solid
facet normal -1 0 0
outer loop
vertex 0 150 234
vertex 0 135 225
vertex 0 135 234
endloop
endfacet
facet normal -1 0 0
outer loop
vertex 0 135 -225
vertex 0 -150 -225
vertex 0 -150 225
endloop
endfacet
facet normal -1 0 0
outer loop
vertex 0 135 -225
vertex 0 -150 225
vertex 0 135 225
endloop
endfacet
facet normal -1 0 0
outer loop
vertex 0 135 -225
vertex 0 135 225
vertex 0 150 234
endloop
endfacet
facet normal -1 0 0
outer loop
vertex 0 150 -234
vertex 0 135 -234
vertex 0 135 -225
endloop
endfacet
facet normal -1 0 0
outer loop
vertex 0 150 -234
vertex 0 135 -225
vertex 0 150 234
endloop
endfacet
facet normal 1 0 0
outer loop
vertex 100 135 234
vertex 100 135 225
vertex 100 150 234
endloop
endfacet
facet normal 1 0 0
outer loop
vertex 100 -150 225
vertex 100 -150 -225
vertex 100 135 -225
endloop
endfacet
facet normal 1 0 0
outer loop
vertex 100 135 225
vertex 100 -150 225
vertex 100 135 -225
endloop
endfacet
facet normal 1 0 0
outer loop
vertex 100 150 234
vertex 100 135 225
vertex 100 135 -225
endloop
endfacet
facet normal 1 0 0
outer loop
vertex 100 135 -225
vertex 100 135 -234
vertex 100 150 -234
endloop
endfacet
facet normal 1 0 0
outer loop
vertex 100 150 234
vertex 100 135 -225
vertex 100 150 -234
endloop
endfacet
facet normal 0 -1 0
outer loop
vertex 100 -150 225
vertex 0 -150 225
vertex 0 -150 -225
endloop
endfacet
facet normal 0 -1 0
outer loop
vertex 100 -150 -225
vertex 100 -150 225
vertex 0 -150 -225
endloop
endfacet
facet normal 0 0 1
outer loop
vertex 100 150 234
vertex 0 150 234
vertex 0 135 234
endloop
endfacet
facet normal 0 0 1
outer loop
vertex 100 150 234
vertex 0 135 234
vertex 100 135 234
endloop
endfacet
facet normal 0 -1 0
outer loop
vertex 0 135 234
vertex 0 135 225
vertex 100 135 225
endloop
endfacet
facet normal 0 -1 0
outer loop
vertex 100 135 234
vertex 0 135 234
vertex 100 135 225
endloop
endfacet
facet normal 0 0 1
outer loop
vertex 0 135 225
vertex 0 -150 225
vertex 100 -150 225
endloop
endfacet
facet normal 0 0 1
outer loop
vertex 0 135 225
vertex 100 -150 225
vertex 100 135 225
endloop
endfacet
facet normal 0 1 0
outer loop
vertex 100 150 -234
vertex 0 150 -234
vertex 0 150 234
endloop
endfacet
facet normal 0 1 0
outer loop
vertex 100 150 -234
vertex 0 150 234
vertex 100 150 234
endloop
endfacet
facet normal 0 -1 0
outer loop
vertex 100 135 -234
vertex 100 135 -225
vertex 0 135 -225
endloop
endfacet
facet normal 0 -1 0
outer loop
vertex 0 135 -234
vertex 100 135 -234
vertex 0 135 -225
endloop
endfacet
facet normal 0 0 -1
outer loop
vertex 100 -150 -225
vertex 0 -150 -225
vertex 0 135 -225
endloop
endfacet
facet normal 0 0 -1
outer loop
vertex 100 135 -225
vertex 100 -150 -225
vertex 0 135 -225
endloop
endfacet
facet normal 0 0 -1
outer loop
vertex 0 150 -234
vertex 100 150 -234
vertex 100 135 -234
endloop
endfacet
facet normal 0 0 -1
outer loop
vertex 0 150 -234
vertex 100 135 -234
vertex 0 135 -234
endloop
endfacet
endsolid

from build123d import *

# Parameters (mm, degrees)
CROQUIS2_W              = 450
CROQUIS2_H              = 300
SALIENTE_EXTRUIR1_DEPTH = 100
CROQUIS4_W              = 100
CROQUIS4_H              = 15
SALIENTE_EXTRUIR2_DEPTH = 9
CROQUIS5_W              = 100
CROQUIS5_H              = 15
SALIENTE_EXTRUIR3_DEPTH = 9


with BuildPart() as part:
    # Croquis2 → Saliente-Extruir1 (new body)
    with BuildSketch(Plane(origin=(0, 0, 0), x_dir=(0, 0, -1), z_dir=(1, 0, 0))):
        Rectangle(CROQUIS2_W, CROQUIS2_H)
    extrude(amount=SALIENTE_EXTRUIR1_DEPTH)

    # Croquis4 → Saliente-Extruir2 (add)
    with BuildSketch(Plane(origin=(0, 0, -225), x_dir=(-1, 0, 0), z_dir=(0, 0, -1))):
        with Locations((-50, 142.5)):
            Rectangle(CROQUIS4_W, CROQUIS4_H)
    extrude(amount=SALIENTE_EXTRUIR2_DEPTH)

    # Croquis5 → Saliente-Extruir3 (add)
    with BuildSketch(Plane.XY.offset(225)):
        with Locations((50, 142.5)):
            Rectangle(CROQUIS5_W, CROQUIS5_H)
    extrude(amount=SALIENTE_EXTRUIR3_DEPTH)


solid = part.part
